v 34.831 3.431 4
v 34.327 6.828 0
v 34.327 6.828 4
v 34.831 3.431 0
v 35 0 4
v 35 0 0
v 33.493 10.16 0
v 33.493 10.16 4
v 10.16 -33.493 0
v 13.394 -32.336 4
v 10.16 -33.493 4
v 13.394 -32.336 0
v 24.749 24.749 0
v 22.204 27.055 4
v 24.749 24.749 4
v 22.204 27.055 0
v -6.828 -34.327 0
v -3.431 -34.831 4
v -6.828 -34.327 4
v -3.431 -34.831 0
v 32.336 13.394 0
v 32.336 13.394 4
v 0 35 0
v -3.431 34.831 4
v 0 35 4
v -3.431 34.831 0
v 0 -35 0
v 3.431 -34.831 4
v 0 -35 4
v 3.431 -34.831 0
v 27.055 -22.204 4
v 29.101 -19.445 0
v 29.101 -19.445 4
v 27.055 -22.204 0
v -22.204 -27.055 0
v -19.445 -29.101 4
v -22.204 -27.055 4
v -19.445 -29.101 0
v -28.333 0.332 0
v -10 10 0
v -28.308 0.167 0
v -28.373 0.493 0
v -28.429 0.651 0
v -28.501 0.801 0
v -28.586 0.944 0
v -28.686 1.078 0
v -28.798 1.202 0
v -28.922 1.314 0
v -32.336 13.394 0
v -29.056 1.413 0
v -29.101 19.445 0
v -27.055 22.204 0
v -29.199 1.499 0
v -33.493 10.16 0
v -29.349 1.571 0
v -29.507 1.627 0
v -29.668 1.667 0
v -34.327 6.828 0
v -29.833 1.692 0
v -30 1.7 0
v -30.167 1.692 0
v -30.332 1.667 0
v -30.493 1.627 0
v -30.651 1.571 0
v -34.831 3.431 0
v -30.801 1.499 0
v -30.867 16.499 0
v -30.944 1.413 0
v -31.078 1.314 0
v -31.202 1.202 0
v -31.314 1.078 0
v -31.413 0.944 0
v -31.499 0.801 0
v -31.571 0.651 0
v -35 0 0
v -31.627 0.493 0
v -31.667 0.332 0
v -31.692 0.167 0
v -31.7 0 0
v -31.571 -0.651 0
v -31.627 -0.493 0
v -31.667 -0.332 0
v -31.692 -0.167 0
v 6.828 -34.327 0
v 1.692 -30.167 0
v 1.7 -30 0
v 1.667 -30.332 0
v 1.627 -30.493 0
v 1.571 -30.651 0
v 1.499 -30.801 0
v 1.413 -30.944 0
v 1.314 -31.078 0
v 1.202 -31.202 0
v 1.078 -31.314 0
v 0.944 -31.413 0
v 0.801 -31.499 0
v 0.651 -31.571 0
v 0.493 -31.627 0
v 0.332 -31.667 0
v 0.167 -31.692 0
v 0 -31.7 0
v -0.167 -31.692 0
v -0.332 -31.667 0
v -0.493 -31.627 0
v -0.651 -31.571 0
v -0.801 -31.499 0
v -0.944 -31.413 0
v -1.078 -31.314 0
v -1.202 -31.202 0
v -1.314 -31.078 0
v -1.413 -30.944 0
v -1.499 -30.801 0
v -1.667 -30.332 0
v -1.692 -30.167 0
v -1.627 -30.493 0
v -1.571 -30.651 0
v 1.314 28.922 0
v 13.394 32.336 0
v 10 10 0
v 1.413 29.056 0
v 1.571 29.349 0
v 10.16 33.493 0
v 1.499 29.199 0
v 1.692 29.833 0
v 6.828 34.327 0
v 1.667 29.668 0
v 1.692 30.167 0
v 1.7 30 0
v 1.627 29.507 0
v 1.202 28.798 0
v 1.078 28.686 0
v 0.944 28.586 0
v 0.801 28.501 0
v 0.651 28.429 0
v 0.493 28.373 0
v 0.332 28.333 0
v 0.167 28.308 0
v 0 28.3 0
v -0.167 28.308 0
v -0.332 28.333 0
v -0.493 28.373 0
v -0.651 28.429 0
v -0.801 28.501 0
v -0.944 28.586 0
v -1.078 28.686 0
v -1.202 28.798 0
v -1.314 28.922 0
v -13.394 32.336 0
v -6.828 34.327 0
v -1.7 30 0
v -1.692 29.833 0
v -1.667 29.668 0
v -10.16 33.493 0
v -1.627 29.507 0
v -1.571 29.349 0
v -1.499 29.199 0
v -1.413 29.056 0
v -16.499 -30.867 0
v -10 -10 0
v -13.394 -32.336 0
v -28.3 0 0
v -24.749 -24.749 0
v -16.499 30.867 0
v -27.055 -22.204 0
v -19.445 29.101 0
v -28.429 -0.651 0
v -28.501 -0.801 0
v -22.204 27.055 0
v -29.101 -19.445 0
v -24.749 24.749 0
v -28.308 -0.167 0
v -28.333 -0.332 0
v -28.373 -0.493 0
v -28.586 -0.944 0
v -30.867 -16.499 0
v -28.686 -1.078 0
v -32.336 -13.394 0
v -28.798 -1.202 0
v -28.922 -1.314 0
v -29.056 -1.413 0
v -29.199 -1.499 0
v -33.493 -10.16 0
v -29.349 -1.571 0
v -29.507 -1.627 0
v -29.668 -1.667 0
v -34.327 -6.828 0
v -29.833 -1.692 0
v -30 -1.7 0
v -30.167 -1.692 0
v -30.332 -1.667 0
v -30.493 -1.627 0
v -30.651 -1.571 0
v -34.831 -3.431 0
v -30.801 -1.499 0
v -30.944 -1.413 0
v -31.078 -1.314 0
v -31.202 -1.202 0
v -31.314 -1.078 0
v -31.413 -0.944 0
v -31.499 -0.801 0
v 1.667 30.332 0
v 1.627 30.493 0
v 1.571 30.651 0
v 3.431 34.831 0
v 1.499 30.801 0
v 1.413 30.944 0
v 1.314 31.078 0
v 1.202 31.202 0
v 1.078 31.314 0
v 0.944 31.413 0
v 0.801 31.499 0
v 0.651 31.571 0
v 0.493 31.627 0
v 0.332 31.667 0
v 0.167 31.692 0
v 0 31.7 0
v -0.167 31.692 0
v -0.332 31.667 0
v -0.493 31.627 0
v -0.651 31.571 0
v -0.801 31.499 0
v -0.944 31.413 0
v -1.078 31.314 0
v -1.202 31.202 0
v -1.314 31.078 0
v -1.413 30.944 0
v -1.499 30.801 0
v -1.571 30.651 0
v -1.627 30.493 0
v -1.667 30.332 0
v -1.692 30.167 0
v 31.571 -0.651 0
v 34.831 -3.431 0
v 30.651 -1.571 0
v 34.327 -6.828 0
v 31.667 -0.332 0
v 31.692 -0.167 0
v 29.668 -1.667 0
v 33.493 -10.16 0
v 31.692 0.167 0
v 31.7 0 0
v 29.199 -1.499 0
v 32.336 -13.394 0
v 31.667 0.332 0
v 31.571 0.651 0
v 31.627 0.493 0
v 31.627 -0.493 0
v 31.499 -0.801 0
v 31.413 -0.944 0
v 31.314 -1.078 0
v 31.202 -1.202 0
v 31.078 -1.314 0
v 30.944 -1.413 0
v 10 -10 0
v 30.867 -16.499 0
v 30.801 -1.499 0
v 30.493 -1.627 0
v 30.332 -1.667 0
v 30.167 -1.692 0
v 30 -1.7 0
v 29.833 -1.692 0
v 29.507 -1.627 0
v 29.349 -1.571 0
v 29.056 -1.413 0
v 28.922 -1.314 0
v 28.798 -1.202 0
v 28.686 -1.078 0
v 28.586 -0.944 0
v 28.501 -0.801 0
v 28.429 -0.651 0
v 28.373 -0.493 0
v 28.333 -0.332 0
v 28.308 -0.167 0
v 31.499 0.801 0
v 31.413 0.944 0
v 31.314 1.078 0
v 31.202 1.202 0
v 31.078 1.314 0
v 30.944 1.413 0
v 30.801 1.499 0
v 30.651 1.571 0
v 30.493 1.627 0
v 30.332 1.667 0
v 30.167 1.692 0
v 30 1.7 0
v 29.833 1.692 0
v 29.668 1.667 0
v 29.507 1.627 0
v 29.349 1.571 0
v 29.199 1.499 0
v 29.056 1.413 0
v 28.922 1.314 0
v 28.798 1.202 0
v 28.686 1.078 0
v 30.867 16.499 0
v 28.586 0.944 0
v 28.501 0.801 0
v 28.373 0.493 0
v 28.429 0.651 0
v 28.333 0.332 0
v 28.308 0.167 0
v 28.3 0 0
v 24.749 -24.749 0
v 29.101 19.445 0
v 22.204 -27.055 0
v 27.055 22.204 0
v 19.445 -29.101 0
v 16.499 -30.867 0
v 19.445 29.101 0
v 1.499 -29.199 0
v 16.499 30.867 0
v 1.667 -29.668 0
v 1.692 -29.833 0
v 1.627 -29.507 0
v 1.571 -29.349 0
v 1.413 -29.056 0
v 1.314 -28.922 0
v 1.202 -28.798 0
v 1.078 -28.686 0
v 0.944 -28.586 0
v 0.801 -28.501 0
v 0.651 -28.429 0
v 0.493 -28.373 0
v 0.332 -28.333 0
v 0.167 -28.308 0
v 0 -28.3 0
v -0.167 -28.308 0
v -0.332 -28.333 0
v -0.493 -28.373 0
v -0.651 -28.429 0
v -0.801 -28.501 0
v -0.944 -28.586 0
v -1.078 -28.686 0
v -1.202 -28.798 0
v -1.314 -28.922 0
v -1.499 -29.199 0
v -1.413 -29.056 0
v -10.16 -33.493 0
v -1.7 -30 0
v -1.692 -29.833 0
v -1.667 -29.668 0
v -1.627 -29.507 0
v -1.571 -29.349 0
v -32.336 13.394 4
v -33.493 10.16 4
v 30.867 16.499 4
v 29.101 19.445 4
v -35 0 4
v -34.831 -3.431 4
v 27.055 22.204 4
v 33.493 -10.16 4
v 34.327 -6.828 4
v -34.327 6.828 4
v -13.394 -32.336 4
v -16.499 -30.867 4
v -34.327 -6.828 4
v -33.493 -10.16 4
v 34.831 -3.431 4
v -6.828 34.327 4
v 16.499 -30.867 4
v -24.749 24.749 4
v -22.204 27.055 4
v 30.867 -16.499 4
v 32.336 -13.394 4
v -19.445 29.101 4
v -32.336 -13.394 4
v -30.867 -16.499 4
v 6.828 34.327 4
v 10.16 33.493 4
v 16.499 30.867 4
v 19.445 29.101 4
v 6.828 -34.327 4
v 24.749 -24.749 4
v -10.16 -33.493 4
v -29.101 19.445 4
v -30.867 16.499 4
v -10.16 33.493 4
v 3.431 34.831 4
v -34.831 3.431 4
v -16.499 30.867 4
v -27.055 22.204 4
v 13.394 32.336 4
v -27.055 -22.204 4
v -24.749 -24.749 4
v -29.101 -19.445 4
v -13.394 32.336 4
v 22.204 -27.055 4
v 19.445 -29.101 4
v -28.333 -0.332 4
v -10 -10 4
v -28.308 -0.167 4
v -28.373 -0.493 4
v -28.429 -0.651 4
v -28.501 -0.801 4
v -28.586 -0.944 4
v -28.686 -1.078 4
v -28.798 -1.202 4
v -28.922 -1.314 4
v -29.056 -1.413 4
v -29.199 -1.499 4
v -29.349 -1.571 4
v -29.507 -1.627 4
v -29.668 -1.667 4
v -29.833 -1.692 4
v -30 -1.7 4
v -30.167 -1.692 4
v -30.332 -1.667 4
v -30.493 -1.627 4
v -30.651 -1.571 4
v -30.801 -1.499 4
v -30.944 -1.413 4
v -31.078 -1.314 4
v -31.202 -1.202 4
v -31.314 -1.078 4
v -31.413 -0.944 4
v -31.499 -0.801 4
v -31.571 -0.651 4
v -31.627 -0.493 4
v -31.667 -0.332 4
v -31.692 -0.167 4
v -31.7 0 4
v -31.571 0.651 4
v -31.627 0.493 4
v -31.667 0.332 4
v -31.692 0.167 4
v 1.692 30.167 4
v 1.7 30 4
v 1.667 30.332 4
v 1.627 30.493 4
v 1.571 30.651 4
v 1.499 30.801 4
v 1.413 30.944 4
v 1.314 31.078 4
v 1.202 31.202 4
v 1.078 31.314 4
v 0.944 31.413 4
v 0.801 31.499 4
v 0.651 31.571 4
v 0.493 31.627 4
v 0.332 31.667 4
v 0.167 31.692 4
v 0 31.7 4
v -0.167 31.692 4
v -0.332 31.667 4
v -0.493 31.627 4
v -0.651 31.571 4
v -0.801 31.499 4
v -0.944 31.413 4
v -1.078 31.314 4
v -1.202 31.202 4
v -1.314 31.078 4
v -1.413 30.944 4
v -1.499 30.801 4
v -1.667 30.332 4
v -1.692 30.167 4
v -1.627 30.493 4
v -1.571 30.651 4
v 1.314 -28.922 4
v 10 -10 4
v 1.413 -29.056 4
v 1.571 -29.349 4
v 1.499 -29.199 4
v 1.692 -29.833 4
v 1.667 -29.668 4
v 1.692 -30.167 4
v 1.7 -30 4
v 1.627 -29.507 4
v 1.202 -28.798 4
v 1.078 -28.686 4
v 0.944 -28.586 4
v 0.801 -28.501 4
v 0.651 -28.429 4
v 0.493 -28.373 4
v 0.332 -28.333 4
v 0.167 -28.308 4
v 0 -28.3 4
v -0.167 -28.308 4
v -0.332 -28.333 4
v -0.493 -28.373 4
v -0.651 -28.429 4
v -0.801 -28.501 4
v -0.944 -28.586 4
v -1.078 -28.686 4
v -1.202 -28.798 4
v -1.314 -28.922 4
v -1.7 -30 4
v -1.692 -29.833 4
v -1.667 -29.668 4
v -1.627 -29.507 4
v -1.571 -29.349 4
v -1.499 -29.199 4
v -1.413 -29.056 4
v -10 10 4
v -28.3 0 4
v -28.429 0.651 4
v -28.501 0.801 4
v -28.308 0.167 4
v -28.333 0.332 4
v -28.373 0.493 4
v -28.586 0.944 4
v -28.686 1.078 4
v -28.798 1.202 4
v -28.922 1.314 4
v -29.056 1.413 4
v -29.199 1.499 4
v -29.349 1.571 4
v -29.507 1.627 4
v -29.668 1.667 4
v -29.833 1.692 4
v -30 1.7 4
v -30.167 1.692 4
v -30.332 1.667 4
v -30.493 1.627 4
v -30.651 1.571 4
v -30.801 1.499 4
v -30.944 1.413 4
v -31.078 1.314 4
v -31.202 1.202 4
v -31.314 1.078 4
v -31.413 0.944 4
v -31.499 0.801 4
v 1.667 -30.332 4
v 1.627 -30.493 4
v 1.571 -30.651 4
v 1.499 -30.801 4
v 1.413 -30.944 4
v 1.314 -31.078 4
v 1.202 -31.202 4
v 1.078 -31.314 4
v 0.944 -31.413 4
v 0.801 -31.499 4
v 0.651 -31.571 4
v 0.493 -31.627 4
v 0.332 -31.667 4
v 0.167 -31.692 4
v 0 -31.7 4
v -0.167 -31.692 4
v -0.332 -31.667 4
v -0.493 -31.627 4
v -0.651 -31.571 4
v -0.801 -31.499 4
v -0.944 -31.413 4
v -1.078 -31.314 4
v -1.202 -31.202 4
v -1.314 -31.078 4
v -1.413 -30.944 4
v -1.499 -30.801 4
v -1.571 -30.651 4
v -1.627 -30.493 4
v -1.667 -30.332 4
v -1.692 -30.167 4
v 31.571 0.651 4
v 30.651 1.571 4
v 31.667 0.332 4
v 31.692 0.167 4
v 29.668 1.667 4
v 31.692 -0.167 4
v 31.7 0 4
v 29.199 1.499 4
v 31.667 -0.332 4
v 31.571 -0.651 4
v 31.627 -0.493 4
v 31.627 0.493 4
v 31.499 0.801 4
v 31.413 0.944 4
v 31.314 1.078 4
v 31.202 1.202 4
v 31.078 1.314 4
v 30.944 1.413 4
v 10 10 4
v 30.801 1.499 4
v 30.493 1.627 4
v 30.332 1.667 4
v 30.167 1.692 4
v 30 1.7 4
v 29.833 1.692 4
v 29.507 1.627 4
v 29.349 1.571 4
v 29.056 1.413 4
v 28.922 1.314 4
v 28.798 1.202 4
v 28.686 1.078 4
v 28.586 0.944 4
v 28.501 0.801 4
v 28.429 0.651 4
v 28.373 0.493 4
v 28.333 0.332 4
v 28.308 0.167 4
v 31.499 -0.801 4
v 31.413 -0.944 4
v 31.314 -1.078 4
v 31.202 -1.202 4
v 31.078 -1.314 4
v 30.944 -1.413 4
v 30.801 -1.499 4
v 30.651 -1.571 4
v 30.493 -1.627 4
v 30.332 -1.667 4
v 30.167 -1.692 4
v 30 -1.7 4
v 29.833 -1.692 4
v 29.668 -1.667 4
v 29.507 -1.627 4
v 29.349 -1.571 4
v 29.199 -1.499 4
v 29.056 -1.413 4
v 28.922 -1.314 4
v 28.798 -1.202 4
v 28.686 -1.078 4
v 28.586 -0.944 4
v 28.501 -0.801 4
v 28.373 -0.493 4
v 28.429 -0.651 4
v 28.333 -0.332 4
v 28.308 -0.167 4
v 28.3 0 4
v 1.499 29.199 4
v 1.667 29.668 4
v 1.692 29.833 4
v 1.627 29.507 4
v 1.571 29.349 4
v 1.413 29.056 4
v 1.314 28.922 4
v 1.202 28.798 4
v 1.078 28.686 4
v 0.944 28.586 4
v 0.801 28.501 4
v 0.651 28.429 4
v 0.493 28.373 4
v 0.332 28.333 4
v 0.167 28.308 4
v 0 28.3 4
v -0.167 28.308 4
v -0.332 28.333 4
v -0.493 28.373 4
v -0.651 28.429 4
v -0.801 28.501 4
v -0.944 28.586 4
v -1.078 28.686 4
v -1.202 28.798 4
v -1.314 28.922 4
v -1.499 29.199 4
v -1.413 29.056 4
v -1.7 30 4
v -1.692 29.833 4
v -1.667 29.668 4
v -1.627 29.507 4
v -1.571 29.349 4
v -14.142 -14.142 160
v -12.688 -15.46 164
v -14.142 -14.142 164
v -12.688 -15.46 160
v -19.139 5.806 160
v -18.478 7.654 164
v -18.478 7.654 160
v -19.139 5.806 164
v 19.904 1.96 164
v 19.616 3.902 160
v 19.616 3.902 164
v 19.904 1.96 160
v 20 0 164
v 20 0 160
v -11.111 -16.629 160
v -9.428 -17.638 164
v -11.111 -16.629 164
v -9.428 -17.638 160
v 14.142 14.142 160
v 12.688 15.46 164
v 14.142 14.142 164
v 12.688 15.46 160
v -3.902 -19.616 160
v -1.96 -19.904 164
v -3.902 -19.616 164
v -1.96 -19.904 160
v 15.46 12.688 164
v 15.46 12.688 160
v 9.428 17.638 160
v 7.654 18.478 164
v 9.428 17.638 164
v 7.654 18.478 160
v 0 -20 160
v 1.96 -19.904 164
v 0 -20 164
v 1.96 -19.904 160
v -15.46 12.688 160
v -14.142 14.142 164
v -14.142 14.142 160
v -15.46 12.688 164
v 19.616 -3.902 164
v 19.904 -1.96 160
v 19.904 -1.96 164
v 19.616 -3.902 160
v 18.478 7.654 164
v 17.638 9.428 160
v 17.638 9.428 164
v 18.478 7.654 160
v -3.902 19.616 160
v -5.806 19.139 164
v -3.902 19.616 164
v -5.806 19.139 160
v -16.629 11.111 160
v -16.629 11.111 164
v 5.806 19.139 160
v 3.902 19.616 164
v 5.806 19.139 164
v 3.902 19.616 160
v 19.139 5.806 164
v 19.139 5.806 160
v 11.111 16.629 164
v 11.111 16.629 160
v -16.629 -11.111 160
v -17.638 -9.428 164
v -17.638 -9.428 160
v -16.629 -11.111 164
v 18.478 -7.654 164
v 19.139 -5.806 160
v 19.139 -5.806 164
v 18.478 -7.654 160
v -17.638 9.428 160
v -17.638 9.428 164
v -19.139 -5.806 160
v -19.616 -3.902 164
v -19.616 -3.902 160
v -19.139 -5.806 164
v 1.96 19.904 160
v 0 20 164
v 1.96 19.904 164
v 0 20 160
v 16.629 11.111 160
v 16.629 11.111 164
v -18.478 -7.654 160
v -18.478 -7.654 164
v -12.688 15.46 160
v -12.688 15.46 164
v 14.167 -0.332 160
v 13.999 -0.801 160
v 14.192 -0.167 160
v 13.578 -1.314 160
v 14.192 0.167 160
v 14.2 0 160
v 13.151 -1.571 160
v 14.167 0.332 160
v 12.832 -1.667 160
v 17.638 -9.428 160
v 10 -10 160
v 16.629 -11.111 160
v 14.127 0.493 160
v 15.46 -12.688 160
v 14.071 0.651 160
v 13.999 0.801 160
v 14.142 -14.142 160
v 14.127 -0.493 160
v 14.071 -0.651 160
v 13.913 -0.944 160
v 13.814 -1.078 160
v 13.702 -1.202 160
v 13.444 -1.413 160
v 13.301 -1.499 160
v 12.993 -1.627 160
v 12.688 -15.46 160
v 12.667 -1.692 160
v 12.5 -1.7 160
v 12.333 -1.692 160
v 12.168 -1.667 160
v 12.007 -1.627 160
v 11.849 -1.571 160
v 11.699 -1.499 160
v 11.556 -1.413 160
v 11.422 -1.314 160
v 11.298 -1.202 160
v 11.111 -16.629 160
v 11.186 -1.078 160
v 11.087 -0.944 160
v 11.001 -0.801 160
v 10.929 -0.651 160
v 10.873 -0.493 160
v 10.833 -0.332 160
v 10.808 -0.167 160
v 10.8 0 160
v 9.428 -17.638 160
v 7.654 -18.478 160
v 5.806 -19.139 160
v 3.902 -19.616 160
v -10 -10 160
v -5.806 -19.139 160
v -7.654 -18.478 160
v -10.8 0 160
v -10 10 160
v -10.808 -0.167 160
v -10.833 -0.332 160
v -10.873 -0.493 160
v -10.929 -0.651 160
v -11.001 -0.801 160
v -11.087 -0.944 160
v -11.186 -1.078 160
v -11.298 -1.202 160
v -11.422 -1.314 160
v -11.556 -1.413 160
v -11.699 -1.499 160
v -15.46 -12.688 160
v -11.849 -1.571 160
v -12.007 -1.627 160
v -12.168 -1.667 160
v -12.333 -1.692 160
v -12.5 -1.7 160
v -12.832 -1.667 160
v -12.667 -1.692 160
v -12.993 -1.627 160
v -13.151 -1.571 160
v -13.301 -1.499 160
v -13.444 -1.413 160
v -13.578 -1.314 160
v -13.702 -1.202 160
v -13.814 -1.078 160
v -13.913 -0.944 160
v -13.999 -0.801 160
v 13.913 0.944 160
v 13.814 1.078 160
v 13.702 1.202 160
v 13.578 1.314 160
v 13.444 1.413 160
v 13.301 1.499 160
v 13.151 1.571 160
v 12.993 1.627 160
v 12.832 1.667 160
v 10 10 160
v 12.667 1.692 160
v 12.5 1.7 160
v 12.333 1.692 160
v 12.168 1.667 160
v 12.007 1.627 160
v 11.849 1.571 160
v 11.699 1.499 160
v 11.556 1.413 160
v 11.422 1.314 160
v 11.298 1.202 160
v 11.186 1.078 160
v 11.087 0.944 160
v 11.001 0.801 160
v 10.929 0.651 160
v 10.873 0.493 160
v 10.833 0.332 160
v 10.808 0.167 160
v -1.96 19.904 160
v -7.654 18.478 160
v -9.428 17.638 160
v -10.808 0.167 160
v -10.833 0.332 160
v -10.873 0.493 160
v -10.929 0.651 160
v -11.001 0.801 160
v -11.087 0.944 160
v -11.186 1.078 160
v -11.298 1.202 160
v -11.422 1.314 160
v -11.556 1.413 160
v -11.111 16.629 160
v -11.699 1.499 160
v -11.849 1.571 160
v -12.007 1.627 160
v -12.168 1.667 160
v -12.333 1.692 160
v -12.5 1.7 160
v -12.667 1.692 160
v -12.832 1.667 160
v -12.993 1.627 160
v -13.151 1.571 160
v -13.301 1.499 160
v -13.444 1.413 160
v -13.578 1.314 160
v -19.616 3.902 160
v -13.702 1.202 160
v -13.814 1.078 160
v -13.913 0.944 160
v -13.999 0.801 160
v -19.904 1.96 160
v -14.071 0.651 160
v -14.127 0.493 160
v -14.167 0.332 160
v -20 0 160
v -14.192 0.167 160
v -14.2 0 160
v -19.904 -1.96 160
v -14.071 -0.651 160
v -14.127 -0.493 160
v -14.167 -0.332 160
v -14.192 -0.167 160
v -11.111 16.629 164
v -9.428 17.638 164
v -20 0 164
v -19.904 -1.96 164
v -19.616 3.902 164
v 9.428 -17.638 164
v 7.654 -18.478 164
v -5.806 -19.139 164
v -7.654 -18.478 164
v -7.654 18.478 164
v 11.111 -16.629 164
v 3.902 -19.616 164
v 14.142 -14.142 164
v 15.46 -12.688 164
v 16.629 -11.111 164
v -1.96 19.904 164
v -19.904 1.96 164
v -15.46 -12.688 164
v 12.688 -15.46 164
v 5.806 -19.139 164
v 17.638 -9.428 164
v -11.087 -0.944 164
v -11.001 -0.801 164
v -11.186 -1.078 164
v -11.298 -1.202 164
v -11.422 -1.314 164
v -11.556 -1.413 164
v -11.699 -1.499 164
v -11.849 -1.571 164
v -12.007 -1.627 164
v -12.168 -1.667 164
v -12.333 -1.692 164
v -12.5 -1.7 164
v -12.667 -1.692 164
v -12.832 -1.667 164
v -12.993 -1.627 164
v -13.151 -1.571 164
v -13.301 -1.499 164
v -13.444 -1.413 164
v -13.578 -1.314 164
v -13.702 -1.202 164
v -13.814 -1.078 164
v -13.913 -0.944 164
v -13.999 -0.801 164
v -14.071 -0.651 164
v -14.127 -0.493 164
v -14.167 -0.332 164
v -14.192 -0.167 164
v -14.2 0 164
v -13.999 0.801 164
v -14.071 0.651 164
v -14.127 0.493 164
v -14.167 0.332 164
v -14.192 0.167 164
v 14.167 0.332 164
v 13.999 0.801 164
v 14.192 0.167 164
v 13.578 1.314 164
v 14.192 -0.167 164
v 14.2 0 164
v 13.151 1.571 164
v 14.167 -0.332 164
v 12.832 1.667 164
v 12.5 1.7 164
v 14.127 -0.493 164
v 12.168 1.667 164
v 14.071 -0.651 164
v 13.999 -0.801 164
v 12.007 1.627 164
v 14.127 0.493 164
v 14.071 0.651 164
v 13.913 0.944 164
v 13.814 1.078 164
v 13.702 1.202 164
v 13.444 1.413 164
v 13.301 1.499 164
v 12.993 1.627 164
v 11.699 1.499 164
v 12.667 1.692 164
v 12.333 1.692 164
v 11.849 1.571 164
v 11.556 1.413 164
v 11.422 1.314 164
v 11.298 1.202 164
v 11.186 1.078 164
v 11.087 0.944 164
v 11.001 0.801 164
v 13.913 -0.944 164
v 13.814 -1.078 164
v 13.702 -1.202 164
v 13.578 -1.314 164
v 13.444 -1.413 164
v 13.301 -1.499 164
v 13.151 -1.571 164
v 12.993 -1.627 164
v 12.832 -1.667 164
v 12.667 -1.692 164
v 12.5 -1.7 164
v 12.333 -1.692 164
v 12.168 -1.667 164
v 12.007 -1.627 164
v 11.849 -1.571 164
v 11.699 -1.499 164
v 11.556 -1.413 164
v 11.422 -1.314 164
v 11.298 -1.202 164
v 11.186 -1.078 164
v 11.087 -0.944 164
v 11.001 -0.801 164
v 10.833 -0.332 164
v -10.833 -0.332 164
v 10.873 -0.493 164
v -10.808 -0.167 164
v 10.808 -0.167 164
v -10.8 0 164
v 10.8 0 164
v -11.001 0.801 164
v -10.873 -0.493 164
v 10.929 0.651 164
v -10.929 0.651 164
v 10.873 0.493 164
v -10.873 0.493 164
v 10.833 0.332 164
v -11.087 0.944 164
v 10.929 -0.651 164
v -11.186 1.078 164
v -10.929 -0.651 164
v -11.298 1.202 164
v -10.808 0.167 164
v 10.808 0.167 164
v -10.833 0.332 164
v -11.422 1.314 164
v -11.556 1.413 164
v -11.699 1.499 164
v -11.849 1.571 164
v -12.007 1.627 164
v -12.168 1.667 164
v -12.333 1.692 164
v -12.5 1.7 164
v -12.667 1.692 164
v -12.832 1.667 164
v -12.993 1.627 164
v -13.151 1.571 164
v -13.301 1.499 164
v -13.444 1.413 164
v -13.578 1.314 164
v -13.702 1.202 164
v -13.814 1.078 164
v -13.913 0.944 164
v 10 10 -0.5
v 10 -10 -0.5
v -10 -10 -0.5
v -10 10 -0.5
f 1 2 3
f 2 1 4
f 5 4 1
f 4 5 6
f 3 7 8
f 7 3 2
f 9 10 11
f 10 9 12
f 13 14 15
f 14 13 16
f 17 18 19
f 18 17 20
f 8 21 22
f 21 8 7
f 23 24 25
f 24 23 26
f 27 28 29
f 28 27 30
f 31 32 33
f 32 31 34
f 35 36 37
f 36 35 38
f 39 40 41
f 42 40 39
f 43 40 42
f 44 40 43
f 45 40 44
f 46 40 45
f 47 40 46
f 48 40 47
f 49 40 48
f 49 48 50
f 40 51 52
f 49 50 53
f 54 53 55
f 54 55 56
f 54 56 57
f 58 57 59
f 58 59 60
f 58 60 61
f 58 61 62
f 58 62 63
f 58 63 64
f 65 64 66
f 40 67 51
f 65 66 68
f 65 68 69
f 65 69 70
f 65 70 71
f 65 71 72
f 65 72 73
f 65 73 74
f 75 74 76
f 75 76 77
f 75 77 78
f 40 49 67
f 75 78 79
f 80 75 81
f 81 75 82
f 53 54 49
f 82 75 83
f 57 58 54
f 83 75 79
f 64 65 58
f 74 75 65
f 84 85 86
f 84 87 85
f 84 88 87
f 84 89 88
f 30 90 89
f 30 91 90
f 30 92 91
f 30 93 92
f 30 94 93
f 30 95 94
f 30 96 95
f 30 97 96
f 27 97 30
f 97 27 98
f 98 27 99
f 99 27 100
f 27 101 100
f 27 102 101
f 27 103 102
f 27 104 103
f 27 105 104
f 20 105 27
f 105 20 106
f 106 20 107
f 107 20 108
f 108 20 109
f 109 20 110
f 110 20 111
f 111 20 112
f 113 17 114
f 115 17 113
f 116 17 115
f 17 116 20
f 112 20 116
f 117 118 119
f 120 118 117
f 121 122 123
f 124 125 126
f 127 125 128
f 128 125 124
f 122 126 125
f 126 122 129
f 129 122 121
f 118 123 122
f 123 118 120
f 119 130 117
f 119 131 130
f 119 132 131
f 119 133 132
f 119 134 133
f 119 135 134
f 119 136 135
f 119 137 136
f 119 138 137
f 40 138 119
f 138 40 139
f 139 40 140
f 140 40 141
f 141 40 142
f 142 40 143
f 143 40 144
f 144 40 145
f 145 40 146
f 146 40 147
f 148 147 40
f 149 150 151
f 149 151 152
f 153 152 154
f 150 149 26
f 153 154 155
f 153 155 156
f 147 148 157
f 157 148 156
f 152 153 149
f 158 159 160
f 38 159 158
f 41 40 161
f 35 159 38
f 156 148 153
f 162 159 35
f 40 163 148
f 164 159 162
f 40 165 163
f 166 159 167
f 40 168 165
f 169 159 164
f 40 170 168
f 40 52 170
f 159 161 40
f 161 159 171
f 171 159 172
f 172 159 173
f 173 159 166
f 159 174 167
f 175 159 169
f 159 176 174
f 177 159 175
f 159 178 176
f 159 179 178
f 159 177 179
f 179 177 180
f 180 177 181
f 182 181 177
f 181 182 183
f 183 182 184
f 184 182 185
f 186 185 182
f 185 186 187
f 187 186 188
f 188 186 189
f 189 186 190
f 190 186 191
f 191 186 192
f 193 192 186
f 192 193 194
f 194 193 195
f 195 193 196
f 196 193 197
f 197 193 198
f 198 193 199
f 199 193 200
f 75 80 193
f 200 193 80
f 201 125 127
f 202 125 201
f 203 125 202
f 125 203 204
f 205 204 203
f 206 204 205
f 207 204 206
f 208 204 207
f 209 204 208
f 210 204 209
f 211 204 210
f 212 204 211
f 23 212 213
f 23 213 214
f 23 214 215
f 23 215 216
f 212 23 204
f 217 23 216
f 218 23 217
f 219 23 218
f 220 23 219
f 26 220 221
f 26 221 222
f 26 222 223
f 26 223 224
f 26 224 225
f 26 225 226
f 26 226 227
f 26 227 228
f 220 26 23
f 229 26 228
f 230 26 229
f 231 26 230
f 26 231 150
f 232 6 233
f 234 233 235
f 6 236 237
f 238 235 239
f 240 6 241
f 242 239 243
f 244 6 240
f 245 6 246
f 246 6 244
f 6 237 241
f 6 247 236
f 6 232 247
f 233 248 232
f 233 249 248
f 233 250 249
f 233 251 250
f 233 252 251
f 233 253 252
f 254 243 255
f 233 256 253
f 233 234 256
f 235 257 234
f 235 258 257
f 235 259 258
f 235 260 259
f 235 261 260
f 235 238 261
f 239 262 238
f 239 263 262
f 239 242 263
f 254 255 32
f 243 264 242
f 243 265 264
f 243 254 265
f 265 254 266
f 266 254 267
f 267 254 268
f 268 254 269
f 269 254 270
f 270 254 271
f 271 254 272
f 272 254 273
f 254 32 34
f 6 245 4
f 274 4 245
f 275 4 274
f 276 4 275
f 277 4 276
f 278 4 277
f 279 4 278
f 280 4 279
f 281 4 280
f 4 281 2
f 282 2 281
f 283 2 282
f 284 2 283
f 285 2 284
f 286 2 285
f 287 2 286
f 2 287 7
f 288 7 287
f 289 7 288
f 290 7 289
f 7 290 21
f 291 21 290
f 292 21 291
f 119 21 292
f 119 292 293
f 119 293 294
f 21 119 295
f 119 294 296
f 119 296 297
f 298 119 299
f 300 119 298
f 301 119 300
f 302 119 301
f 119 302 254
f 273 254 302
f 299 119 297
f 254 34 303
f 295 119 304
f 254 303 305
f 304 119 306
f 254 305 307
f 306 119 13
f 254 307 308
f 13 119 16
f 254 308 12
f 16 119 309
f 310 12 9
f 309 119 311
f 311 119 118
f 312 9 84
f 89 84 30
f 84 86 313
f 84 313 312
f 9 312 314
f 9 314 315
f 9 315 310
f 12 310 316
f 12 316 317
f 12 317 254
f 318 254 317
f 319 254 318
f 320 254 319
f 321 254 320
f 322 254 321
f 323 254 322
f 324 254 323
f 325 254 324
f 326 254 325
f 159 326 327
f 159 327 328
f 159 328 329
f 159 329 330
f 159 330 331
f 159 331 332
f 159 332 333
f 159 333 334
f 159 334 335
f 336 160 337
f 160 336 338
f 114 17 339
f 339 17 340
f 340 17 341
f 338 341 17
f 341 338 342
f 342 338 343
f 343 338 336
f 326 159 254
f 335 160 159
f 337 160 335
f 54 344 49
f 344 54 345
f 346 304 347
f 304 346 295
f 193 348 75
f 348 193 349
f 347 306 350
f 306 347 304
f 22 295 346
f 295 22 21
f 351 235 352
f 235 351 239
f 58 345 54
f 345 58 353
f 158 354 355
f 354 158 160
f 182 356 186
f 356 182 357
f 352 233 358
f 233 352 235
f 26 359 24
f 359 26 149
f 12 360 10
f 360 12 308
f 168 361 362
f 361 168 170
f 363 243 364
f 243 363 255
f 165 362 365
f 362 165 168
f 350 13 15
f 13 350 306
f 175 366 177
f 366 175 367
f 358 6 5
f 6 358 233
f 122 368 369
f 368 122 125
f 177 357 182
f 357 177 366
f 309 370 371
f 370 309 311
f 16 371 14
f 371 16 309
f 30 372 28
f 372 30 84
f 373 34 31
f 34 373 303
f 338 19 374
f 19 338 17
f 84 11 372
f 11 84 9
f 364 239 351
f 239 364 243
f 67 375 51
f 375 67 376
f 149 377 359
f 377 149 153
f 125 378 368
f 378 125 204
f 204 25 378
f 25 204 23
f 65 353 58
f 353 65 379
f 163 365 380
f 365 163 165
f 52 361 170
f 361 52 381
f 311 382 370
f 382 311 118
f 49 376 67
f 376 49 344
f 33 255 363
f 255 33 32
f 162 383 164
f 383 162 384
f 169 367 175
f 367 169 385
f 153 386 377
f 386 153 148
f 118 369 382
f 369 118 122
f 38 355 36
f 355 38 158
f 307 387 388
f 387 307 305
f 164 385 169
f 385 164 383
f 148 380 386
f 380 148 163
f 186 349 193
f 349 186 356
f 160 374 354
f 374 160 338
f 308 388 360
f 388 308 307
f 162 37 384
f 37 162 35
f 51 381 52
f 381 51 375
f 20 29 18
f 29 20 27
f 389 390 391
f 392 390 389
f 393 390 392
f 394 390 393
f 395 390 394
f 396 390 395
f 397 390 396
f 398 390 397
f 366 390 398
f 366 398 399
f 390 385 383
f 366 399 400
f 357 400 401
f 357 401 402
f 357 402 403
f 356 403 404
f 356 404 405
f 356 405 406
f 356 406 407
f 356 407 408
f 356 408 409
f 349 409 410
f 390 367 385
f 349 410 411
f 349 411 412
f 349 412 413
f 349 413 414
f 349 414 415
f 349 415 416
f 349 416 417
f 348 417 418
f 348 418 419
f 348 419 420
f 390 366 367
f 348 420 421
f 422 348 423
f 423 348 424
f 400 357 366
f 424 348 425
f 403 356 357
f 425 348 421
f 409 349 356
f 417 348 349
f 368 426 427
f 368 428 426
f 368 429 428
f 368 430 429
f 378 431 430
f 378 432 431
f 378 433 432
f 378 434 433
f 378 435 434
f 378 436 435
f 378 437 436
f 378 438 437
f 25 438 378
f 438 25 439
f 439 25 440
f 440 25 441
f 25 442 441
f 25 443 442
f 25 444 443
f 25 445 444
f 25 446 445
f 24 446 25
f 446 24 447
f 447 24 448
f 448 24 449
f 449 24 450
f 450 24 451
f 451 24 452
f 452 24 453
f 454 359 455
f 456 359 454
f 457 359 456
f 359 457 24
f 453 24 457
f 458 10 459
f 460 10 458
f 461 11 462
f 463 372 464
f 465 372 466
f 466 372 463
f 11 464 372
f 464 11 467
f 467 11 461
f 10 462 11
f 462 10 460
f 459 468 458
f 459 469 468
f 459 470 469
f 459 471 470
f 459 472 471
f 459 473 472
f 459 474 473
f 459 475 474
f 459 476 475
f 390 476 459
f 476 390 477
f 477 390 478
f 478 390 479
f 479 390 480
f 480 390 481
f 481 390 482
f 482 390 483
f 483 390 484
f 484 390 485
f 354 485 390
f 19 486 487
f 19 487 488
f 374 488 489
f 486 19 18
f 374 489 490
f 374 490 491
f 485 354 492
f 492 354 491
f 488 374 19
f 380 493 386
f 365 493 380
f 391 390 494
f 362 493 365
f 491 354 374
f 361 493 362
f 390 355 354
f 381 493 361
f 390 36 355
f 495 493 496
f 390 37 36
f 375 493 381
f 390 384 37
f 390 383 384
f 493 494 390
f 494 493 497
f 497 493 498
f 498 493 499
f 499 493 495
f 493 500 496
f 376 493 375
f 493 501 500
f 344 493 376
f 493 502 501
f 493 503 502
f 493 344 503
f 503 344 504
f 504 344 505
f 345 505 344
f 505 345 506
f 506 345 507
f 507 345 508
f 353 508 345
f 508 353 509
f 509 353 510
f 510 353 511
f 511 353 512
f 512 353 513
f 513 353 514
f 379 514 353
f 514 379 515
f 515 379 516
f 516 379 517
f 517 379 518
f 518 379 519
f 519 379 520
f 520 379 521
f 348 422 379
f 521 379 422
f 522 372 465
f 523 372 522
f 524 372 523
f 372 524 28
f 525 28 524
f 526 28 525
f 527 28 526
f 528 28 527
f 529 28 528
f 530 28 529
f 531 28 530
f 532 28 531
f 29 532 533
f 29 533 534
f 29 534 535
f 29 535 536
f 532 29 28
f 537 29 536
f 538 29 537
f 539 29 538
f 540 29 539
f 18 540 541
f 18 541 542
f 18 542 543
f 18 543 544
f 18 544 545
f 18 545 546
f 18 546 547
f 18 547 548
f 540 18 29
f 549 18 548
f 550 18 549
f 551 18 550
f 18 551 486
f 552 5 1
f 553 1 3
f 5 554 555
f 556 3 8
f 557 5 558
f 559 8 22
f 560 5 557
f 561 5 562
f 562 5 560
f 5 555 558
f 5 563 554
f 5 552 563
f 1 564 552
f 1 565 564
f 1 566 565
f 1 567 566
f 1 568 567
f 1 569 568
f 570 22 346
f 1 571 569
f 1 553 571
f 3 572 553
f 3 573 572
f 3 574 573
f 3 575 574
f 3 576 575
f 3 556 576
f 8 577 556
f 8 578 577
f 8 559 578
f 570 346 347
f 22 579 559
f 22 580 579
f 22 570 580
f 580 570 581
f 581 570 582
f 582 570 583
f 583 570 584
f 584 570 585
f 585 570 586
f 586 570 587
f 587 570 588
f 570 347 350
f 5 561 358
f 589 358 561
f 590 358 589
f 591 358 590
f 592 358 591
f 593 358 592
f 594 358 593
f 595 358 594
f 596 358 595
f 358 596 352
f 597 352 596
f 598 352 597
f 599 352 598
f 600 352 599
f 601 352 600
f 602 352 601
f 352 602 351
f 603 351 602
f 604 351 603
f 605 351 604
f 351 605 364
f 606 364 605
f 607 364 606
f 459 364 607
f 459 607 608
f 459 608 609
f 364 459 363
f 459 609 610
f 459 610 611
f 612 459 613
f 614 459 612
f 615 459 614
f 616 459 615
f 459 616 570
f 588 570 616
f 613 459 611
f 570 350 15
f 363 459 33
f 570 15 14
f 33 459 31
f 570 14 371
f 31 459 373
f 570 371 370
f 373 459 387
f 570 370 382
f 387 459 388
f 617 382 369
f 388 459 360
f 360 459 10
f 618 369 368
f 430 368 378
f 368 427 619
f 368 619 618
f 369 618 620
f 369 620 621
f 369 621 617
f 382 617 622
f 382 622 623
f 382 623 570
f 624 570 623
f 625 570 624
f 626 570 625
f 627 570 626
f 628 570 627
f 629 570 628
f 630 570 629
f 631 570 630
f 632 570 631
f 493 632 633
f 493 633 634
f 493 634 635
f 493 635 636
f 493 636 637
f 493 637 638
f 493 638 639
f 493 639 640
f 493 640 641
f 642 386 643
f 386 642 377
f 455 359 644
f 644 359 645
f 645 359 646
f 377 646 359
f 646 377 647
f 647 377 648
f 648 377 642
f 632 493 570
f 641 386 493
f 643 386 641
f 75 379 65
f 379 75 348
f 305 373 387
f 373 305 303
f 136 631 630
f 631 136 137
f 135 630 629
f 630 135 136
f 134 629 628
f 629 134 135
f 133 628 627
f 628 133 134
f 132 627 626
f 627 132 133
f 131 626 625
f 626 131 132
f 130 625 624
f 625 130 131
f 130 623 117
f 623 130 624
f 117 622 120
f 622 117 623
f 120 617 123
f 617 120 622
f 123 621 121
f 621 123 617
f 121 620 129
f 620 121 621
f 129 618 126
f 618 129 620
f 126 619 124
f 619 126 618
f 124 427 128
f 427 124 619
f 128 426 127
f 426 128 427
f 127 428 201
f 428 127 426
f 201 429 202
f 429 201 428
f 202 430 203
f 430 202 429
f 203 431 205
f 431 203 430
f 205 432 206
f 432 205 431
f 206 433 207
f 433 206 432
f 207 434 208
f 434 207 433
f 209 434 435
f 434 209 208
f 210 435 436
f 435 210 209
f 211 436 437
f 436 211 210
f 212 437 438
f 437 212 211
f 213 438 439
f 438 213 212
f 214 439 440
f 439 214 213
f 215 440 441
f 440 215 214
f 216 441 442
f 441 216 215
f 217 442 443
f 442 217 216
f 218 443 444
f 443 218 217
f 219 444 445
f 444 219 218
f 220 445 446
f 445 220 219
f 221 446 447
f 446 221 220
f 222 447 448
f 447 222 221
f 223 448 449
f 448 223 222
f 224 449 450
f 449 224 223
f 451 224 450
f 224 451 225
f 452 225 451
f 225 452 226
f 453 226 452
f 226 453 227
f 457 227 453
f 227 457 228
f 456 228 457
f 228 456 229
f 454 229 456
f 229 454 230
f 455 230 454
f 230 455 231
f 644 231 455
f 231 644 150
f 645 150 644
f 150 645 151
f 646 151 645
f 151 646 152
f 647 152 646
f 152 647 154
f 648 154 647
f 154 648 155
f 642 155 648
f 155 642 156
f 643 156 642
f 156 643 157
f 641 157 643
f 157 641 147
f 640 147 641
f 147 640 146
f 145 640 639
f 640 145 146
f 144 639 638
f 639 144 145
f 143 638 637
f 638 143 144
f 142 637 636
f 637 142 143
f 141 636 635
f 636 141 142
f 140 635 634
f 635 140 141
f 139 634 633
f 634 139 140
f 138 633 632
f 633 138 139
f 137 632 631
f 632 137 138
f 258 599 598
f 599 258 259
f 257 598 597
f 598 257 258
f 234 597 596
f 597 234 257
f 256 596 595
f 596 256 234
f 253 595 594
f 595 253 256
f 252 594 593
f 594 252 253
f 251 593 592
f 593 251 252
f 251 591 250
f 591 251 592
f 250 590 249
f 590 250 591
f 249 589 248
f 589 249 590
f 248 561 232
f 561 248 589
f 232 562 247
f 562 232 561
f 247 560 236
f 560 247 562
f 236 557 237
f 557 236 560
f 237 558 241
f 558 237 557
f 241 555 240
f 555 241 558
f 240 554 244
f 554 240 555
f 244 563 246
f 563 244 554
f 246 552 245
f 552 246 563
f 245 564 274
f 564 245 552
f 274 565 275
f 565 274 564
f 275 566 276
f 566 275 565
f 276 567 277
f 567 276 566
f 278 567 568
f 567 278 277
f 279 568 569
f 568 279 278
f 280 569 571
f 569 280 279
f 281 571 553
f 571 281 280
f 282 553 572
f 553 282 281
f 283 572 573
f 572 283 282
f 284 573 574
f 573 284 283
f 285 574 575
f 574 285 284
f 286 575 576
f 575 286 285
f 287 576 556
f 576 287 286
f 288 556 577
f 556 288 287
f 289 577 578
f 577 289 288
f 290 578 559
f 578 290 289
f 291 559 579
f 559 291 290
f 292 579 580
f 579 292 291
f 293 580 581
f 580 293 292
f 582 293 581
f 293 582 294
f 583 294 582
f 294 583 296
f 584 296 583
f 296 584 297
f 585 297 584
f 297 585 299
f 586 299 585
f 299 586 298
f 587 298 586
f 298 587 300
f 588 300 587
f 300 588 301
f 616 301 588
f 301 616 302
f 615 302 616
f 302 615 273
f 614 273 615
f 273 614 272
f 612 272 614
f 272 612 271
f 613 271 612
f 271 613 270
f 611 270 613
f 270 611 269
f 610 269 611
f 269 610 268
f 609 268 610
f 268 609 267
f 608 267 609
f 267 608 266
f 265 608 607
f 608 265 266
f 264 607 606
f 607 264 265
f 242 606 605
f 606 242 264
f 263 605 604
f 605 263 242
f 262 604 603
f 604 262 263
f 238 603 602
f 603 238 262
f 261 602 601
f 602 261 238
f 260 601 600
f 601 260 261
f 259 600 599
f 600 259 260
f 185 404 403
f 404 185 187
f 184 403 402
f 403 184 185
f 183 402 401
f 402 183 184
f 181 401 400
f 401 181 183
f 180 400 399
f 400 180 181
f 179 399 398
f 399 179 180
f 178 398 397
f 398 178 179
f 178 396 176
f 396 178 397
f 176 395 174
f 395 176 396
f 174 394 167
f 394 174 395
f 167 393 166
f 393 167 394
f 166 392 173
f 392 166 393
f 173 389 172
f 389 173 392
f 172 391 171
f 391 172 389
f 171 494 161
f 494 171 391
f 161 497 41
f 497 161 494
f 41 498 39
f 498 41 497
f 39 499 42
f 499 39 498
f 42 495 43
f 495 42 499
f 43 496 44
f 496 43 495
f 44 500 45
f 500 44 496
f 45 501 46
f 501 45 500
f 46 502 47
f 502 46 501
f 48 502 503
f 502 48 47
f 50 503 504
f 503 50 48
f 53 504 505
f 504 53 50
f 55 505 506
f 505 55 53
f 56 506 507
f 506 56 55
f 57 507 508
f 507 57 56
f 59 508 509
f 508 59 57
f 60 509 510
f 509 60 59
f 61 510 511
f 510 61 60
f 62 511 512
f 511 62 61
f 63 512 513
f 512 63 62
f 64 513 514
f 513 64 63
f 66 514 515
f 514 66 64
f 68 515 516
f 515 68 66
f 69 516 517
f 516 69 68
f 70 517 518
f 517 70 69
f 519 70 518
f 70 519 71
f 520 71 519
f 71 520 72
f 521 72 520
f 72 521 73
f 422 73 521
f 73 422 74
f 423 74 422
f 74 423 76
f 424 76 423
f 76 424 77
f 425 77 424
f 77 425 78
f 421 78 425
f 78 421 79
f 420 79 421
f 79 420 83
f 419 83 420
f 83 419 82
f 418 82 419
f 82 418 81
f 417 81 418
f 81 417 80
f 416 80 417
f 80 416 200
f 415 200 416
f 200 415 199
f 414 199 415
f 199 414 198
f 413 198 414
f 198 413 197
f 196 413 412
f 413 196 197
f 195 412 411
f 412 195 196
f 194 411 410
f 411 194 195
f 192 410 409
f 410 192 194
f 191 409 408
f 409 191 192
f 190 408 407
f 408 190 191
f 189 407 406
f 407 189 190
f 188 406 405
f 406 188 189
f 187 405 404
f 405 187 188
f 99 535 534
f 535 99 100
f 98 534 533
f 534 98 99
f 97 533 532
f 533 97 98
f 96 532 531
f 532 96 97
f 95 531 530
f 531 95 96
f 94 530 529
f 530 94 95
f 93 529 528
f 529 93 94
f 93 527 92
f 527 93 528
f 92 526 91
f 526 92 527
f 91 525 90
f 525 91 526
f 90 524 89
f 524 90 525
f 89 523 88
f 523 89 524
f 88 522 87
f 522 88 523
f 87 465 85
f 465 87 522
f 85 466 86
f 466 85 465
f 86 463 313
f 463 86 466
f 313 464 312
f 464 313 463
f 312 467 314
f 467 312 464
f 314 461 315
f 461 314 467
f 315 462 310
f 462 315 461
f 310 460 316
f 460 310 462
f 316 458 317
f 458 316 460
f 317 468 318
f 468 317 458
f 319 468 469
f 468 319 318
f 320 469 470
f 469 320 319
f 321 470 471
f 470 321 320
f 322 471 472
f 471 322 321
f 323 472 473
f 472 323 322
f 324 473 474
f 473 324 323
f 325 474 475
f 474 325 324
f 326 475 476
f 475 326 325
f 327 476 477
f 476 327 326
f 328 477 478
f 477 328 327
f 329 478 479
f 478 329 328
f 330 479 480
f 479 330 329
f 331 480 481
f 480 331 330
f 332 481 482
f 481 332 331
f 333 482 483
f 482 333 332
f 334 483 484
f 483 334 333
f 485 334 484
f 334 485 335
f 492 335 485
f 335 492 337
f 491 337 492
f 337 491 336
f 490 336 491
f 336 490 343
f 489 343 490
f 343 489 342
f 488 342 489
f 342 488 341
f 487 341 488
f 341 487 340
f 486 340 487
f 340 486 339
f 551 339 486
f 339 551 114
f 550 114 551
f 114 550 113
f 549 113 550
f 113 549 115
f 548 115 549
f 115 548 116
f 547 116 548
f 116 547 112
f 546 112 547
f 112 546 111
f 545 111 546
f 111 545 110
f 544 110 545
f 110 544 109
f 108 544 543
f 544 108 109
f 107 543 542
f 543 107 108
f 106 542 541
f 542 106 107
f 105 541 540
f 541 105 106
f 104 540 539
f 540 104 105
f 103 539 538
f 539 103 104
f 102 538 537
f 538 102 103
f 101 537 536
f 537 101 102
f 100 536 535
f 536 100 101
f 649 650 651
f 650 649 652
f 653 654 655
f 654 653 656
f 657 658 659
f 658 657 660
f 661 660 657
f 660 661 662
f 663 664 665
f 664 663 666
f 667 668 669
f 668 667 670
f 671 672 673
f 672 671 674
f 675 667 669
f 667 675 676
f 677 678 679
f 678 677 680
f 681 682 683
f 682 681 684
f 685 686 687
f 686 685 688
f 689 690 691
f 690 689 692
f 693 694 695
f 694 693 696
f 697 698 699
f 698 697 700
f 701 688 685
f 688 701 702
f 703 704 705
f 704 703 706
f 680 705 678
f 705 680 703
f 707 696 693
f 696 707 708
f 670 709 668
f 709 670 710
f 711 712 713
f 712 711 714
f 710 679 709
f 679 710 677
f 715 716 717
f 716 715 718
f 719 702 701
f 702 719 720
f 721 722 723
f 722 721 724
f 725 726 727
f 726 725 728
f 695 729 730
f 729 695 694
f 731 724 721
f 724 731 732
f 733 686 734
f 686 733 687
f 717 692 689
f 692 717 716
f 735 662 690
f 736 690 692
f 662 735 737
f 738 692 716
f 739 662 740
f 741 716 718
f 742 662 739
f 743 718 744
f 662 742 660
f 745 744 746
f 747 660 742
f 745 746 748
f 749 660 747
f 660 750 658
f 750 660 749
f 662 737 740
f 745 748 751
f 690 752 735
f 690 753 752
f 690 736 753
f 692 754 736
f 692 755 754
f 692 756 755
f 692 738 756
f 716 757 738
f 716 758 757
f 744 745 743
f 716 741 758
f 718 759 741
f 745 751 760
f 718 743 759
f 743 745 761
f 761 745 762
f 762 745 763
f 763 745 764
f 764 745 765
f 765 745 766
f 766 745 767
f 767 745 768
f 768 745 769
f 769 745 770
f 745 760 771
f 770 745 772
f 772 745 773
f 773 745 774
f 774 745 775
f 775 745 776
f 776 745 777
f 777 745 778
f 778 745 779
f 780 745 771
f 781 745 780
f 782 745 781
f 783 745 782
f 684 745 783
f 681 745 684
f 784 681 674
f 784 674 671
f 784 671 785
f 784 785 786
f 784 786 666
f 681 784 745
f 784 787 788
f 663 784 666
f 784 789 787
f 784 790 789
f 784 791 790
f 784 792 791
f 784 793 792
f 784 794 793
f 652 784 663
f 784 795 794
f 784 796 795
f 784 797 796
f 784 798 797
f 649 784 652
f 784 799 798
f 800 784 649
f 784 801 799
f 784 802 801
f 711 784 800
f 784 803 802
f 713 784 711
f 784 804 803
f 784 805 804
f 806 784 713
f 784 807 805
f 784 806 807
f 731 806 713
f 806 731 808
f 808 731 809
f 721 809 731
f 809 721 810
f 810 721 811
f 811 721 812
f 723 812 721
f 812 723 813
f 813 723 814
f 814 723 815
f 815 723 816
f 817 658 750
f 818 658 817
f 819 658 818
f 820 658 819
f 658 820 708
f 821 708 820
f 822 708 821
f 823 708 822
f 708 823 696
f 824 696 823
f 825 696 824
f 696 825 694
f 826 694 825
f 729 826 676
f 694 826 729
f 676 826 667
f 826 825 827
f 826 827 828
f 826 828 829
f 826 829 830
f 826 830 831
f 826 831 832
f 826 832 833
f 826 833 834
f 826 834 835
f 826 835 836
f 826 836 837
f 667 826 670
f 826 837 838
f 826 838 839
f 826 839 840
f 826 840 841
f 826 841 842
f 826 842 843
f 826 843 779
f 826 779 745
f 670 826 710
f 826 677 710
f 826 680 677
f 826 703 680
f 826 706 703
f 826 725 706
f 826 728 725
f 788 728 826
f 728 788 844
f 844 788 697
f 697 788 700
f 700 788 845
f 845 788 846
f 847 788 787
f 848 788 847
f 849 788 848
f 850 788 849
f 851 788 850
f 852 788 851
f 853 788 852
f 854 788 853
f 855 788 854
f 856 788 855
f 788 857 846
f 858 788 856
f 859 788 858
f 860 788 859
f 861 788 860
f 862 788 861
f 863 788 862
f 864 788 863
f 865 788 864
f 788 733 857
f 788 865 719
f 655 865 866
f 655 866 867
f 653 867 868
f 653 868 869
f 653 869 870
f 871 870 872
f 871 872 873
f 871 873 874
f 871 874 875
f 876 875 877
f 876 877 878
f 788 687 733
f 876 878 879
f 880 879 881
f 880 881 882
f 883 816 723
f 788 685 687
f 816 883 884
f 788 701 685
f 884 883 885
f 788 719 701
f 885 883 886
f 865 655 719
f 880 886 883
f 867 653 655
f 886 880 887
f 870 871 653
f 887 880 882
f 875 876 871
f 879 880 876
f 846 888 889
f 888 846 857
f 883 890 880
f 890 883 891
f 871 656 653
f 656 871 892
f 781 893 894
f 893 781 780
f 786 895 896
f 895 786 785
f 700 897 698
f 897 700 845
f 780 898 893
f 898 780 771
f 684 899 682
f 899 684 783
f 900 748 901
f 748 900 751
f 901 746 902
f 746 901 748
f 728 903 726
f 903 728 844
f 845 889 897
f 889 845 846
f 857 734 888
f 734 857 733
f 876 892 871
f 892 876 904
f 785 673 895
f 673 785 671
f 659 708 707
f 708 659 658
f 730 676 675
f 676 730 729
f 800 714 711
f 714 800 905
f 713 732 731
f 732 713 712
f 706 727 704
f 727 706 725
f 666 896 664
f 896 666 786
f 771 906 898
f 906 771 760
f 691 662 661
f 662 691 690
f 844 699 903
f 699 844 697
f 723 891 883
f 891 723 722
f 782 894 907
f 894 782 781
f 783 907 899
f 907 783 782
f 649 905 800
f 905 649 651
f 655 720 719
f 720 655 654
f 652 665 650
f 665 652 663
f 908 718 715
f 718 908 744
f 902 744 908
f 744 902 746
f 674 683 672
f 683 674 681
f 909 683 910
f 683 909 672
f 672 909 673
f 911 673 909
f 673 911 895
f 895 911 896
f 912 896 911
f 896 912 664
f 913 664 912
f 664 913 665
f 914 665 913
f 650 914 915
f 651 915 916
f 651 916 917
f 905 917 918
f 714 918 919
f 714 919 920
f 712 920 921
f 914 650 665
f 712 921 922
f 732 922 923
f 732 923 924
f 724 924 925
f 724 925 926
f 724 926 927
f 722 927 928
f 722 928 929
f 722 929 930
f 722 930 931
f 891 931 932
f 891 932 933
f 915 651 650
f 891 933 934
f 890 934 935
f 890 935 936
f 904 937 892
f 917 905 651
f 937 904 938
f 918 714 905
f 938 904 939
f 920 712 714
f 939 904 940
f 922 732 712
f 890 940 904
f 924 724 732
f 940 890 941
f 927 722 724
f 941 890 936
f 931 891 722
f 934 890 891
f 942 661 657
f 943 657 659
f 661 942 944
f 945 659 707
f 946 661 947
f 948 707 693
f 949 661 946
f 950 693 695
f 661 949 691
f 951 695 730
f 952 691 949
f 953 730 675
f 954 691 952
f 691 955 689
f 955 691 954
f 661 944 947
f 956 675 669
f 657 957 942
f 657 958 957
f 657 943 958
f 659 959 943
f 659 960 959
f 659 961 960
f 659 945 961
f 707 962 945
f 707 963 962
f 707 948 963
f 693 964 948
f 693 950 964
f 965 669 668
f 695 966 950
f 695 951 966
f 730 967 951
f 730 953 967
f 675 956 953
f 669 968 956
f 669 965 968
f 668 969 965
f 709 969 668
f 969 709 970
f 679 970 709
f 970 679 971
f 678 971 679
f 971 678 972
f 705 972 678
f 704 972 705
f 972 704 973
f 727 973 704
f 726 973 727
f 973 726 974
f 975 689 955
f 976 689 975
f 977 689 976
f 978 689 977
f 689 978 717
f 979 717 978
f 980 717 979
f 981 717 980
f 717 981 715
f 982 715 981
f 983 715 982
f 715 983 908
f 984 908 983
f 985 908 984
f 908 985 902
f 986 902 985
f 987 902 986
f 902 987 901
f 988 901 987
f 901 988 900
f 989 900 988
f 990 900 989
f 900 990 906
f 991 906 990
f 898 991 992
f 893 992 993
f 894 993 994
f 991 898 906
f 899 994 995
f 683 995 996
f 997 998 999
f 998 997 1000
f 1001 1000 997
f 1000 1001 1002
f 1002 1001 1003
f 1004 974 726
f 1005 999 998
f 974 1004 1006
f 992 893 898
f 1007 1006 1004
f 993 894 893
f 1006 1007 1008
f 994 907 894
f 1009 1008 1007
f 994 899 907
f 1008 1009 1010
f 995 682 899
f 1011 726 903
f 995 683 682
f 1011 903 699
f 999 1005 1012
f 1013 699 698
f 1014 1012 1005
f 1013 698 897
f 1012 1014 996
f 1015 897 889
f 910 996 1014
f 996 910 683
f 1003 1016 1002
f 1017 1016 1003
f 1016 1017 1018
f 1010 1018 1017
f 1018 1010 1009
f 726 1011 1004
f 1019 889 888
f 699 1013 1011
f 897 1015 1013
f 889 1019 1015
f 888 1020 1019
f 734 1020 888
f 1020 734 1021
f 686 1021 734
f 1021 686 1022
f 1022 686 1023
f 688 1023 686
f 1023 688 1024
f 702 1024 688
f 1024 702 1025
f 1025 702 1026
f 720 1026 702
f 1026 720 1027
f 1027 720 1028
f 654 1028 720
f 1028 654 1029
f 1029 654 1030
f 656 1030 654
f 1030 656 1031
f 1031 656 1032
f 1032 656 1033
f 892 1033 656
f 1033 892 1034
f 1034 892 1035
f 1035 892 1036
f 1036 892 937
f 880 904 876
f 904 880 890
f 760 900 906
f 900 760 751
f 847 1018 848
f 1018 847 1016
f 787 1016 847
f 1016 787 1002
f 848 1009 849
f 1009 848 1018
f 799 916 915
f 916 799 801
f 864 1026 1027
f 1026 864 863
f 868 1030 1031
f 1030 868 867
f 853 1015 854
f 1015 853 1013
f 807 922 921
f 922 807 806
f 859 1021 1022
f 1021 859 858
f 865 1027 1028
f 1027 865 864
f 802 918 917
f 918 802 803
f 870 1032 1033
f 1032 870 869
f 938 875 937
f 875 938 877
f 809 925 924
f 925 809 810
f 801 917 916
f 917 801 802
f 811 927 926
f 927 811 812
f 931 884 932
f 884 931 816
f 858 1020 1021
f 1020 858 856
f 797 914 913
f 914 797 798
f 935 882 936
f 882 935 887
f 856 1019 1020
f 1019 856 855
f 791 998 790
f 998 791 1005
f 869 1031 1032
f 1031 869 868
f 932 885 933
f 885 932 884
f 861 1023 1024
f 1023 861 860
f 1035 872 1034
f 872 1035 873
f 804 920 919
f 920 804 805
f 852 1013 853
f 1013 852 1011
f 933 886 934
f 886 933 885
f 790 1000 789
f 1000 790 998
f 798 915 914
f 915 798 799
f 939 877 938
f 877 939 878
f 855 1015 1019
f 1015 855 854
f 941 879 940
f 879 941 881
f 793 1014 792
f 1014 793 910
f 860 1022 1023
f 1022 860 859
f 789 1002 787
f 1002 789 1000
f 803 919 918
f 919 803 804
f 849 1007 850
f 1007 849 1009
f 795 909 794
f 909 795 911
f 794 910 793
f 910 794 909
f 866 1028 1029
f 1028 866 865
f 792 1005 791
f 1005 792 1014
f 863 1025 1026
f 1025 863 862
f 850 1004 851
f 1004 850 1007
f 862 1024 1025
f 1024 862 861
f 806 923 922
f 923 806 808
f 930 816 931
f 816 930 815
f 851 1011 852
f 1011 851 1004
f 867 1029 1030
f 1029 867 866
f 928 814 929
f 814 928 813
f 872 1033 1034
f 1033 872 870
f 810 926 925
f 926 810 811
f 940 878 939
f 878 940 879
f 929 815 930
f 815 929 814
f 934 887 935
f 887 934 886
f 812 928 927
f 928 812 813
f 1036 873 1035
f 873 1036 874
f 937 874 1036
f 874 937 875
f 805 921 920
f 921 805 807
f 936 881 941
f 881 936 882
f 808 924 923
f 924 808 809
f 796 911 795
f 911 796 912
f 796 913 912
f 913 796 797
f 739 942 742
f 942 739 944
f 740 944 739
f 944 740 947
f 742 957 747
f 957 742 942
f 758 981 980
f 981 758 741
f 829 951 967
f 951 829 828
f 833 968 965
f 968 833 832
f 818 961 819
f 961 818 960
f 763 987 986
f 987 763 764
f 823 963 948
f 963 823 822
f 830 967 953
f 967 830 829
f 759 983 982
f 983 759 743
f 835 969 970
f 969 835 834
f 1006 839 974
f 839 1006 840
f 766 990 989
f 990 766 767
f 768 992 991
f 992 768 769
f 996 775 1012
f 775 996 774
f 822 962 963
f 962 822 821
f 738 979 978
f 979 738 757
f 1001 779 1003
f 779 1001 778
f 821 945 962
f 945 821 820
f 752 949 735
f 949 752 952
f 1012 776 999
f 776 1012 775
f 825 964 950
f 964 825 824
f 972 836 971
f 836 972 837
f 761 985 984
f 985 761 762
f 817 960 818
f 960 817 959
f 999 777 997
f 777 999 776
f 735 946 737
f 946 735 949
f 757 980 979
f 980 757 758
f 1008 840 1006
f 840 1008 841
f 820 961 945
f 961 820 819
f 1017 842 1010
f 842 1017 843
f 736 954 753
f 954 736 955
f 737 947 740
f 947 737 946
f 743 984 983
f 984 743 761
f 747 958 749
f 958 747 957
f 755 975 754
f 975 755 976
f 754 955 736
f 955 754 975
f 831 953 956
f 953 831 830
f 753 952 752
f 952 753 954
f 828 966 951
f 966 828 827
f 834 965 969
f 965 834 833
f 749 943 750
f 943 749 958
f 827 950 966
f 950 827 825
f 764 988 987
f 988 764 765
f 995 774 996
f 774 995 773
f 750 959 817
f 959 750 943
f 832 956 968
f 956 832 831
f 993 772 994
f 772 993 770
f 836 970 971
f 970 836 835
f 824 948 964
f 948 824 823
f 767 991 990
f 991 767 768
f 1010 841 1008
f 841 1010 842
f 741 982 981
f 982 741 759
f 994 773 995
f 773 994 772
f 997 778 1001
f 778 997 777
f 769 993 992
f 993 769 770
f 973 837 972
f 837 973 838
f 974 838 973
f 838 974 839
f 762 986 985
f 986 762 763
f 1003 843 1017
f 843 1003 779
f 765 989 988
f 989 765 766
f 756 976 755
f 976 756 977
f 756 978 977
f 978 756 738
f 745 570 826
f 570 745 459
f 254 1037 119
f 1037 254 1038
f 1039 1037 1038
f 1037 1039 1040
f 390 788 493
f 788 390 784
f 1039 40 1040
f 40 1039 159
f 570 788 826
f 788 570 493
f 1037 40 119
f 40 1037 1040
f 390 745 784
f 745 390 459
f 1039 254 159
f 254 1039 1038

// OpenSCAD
// Mast (vertical column) -- see PRINTS.md. Connects the platter to the
// LiDAR mount bracket. Solid post (not hollow) for print simplicity and
// rigidity; route the LiDAR's 4 wires externally, zip-tied to the mast
// (see BUILD.md) rather than through an internal channel.
// Print standing up, no supports needed for the post itself; the flanges'
// undersides may want a brim. PETG recommended (PLA can creep/lean
// slightly over time under the sensor's small offset load).
$fn = 64;

post_w = 20;         // square post cross-section
post_h = 160;        // platter-top to lidar-mount-face height -- see
                      // ARCHITECTURE.md for why this clearance matters

bottom_flange_d = 70;
bottom_flange_t = 4;
mast_bolt_circle_d = 60;   // MUST match platter.scad's mast_bolt_circle_d
mast_hole_d = 3.4;
mast_angles = [0, 90, 180, 270];

top_flange_d = 40;
top_flange_t = 4;
lidar_bolt_spacing = 25;   // 2-hole pattern, see lidar_mount.scad
lidar_hole_d = 3.4;

module bolt_circle_holes(bolt_circle_d, hole_d, angles) {
    for (a = angles)
        rotate([0, 0, a])
            translate([bolt_circle_d / 2, 0])
                circle(d = hole_d);
}

module bottom_flange() {
    difference() {
        cylinder(d = bottom_flange_d, h = bottom_flange_t);
        translate([0, 0, -1])
            linear_extrude(bottom_flange_t + 2)
                bolt_circle_holes(mast_bolt_circle_d, mast_hole_d, mast_angles);
    }
}

module top_flange() {
    translate([0, 0, post_h])
        difference() {
            cylinder(d = top_flange_d, h = top_flange_t);
            translate([-lidar_bolt_spacing / 2, 0, -1]) cylinder(d = lidar_hole_d, h = top_flange_t + 2);
            translate([lidar_bolt_spacing / 2, 0, -1]) cylinder(d = lidar_hole_d, h = top_flange_t + 2);
        }
}

union() {
    bottom_flange();
    translate([-post_w / 2, -post_w / 2, -0.5]) cube([post_w, post_w, post_h + 0.5]);
    top_flange();
}
